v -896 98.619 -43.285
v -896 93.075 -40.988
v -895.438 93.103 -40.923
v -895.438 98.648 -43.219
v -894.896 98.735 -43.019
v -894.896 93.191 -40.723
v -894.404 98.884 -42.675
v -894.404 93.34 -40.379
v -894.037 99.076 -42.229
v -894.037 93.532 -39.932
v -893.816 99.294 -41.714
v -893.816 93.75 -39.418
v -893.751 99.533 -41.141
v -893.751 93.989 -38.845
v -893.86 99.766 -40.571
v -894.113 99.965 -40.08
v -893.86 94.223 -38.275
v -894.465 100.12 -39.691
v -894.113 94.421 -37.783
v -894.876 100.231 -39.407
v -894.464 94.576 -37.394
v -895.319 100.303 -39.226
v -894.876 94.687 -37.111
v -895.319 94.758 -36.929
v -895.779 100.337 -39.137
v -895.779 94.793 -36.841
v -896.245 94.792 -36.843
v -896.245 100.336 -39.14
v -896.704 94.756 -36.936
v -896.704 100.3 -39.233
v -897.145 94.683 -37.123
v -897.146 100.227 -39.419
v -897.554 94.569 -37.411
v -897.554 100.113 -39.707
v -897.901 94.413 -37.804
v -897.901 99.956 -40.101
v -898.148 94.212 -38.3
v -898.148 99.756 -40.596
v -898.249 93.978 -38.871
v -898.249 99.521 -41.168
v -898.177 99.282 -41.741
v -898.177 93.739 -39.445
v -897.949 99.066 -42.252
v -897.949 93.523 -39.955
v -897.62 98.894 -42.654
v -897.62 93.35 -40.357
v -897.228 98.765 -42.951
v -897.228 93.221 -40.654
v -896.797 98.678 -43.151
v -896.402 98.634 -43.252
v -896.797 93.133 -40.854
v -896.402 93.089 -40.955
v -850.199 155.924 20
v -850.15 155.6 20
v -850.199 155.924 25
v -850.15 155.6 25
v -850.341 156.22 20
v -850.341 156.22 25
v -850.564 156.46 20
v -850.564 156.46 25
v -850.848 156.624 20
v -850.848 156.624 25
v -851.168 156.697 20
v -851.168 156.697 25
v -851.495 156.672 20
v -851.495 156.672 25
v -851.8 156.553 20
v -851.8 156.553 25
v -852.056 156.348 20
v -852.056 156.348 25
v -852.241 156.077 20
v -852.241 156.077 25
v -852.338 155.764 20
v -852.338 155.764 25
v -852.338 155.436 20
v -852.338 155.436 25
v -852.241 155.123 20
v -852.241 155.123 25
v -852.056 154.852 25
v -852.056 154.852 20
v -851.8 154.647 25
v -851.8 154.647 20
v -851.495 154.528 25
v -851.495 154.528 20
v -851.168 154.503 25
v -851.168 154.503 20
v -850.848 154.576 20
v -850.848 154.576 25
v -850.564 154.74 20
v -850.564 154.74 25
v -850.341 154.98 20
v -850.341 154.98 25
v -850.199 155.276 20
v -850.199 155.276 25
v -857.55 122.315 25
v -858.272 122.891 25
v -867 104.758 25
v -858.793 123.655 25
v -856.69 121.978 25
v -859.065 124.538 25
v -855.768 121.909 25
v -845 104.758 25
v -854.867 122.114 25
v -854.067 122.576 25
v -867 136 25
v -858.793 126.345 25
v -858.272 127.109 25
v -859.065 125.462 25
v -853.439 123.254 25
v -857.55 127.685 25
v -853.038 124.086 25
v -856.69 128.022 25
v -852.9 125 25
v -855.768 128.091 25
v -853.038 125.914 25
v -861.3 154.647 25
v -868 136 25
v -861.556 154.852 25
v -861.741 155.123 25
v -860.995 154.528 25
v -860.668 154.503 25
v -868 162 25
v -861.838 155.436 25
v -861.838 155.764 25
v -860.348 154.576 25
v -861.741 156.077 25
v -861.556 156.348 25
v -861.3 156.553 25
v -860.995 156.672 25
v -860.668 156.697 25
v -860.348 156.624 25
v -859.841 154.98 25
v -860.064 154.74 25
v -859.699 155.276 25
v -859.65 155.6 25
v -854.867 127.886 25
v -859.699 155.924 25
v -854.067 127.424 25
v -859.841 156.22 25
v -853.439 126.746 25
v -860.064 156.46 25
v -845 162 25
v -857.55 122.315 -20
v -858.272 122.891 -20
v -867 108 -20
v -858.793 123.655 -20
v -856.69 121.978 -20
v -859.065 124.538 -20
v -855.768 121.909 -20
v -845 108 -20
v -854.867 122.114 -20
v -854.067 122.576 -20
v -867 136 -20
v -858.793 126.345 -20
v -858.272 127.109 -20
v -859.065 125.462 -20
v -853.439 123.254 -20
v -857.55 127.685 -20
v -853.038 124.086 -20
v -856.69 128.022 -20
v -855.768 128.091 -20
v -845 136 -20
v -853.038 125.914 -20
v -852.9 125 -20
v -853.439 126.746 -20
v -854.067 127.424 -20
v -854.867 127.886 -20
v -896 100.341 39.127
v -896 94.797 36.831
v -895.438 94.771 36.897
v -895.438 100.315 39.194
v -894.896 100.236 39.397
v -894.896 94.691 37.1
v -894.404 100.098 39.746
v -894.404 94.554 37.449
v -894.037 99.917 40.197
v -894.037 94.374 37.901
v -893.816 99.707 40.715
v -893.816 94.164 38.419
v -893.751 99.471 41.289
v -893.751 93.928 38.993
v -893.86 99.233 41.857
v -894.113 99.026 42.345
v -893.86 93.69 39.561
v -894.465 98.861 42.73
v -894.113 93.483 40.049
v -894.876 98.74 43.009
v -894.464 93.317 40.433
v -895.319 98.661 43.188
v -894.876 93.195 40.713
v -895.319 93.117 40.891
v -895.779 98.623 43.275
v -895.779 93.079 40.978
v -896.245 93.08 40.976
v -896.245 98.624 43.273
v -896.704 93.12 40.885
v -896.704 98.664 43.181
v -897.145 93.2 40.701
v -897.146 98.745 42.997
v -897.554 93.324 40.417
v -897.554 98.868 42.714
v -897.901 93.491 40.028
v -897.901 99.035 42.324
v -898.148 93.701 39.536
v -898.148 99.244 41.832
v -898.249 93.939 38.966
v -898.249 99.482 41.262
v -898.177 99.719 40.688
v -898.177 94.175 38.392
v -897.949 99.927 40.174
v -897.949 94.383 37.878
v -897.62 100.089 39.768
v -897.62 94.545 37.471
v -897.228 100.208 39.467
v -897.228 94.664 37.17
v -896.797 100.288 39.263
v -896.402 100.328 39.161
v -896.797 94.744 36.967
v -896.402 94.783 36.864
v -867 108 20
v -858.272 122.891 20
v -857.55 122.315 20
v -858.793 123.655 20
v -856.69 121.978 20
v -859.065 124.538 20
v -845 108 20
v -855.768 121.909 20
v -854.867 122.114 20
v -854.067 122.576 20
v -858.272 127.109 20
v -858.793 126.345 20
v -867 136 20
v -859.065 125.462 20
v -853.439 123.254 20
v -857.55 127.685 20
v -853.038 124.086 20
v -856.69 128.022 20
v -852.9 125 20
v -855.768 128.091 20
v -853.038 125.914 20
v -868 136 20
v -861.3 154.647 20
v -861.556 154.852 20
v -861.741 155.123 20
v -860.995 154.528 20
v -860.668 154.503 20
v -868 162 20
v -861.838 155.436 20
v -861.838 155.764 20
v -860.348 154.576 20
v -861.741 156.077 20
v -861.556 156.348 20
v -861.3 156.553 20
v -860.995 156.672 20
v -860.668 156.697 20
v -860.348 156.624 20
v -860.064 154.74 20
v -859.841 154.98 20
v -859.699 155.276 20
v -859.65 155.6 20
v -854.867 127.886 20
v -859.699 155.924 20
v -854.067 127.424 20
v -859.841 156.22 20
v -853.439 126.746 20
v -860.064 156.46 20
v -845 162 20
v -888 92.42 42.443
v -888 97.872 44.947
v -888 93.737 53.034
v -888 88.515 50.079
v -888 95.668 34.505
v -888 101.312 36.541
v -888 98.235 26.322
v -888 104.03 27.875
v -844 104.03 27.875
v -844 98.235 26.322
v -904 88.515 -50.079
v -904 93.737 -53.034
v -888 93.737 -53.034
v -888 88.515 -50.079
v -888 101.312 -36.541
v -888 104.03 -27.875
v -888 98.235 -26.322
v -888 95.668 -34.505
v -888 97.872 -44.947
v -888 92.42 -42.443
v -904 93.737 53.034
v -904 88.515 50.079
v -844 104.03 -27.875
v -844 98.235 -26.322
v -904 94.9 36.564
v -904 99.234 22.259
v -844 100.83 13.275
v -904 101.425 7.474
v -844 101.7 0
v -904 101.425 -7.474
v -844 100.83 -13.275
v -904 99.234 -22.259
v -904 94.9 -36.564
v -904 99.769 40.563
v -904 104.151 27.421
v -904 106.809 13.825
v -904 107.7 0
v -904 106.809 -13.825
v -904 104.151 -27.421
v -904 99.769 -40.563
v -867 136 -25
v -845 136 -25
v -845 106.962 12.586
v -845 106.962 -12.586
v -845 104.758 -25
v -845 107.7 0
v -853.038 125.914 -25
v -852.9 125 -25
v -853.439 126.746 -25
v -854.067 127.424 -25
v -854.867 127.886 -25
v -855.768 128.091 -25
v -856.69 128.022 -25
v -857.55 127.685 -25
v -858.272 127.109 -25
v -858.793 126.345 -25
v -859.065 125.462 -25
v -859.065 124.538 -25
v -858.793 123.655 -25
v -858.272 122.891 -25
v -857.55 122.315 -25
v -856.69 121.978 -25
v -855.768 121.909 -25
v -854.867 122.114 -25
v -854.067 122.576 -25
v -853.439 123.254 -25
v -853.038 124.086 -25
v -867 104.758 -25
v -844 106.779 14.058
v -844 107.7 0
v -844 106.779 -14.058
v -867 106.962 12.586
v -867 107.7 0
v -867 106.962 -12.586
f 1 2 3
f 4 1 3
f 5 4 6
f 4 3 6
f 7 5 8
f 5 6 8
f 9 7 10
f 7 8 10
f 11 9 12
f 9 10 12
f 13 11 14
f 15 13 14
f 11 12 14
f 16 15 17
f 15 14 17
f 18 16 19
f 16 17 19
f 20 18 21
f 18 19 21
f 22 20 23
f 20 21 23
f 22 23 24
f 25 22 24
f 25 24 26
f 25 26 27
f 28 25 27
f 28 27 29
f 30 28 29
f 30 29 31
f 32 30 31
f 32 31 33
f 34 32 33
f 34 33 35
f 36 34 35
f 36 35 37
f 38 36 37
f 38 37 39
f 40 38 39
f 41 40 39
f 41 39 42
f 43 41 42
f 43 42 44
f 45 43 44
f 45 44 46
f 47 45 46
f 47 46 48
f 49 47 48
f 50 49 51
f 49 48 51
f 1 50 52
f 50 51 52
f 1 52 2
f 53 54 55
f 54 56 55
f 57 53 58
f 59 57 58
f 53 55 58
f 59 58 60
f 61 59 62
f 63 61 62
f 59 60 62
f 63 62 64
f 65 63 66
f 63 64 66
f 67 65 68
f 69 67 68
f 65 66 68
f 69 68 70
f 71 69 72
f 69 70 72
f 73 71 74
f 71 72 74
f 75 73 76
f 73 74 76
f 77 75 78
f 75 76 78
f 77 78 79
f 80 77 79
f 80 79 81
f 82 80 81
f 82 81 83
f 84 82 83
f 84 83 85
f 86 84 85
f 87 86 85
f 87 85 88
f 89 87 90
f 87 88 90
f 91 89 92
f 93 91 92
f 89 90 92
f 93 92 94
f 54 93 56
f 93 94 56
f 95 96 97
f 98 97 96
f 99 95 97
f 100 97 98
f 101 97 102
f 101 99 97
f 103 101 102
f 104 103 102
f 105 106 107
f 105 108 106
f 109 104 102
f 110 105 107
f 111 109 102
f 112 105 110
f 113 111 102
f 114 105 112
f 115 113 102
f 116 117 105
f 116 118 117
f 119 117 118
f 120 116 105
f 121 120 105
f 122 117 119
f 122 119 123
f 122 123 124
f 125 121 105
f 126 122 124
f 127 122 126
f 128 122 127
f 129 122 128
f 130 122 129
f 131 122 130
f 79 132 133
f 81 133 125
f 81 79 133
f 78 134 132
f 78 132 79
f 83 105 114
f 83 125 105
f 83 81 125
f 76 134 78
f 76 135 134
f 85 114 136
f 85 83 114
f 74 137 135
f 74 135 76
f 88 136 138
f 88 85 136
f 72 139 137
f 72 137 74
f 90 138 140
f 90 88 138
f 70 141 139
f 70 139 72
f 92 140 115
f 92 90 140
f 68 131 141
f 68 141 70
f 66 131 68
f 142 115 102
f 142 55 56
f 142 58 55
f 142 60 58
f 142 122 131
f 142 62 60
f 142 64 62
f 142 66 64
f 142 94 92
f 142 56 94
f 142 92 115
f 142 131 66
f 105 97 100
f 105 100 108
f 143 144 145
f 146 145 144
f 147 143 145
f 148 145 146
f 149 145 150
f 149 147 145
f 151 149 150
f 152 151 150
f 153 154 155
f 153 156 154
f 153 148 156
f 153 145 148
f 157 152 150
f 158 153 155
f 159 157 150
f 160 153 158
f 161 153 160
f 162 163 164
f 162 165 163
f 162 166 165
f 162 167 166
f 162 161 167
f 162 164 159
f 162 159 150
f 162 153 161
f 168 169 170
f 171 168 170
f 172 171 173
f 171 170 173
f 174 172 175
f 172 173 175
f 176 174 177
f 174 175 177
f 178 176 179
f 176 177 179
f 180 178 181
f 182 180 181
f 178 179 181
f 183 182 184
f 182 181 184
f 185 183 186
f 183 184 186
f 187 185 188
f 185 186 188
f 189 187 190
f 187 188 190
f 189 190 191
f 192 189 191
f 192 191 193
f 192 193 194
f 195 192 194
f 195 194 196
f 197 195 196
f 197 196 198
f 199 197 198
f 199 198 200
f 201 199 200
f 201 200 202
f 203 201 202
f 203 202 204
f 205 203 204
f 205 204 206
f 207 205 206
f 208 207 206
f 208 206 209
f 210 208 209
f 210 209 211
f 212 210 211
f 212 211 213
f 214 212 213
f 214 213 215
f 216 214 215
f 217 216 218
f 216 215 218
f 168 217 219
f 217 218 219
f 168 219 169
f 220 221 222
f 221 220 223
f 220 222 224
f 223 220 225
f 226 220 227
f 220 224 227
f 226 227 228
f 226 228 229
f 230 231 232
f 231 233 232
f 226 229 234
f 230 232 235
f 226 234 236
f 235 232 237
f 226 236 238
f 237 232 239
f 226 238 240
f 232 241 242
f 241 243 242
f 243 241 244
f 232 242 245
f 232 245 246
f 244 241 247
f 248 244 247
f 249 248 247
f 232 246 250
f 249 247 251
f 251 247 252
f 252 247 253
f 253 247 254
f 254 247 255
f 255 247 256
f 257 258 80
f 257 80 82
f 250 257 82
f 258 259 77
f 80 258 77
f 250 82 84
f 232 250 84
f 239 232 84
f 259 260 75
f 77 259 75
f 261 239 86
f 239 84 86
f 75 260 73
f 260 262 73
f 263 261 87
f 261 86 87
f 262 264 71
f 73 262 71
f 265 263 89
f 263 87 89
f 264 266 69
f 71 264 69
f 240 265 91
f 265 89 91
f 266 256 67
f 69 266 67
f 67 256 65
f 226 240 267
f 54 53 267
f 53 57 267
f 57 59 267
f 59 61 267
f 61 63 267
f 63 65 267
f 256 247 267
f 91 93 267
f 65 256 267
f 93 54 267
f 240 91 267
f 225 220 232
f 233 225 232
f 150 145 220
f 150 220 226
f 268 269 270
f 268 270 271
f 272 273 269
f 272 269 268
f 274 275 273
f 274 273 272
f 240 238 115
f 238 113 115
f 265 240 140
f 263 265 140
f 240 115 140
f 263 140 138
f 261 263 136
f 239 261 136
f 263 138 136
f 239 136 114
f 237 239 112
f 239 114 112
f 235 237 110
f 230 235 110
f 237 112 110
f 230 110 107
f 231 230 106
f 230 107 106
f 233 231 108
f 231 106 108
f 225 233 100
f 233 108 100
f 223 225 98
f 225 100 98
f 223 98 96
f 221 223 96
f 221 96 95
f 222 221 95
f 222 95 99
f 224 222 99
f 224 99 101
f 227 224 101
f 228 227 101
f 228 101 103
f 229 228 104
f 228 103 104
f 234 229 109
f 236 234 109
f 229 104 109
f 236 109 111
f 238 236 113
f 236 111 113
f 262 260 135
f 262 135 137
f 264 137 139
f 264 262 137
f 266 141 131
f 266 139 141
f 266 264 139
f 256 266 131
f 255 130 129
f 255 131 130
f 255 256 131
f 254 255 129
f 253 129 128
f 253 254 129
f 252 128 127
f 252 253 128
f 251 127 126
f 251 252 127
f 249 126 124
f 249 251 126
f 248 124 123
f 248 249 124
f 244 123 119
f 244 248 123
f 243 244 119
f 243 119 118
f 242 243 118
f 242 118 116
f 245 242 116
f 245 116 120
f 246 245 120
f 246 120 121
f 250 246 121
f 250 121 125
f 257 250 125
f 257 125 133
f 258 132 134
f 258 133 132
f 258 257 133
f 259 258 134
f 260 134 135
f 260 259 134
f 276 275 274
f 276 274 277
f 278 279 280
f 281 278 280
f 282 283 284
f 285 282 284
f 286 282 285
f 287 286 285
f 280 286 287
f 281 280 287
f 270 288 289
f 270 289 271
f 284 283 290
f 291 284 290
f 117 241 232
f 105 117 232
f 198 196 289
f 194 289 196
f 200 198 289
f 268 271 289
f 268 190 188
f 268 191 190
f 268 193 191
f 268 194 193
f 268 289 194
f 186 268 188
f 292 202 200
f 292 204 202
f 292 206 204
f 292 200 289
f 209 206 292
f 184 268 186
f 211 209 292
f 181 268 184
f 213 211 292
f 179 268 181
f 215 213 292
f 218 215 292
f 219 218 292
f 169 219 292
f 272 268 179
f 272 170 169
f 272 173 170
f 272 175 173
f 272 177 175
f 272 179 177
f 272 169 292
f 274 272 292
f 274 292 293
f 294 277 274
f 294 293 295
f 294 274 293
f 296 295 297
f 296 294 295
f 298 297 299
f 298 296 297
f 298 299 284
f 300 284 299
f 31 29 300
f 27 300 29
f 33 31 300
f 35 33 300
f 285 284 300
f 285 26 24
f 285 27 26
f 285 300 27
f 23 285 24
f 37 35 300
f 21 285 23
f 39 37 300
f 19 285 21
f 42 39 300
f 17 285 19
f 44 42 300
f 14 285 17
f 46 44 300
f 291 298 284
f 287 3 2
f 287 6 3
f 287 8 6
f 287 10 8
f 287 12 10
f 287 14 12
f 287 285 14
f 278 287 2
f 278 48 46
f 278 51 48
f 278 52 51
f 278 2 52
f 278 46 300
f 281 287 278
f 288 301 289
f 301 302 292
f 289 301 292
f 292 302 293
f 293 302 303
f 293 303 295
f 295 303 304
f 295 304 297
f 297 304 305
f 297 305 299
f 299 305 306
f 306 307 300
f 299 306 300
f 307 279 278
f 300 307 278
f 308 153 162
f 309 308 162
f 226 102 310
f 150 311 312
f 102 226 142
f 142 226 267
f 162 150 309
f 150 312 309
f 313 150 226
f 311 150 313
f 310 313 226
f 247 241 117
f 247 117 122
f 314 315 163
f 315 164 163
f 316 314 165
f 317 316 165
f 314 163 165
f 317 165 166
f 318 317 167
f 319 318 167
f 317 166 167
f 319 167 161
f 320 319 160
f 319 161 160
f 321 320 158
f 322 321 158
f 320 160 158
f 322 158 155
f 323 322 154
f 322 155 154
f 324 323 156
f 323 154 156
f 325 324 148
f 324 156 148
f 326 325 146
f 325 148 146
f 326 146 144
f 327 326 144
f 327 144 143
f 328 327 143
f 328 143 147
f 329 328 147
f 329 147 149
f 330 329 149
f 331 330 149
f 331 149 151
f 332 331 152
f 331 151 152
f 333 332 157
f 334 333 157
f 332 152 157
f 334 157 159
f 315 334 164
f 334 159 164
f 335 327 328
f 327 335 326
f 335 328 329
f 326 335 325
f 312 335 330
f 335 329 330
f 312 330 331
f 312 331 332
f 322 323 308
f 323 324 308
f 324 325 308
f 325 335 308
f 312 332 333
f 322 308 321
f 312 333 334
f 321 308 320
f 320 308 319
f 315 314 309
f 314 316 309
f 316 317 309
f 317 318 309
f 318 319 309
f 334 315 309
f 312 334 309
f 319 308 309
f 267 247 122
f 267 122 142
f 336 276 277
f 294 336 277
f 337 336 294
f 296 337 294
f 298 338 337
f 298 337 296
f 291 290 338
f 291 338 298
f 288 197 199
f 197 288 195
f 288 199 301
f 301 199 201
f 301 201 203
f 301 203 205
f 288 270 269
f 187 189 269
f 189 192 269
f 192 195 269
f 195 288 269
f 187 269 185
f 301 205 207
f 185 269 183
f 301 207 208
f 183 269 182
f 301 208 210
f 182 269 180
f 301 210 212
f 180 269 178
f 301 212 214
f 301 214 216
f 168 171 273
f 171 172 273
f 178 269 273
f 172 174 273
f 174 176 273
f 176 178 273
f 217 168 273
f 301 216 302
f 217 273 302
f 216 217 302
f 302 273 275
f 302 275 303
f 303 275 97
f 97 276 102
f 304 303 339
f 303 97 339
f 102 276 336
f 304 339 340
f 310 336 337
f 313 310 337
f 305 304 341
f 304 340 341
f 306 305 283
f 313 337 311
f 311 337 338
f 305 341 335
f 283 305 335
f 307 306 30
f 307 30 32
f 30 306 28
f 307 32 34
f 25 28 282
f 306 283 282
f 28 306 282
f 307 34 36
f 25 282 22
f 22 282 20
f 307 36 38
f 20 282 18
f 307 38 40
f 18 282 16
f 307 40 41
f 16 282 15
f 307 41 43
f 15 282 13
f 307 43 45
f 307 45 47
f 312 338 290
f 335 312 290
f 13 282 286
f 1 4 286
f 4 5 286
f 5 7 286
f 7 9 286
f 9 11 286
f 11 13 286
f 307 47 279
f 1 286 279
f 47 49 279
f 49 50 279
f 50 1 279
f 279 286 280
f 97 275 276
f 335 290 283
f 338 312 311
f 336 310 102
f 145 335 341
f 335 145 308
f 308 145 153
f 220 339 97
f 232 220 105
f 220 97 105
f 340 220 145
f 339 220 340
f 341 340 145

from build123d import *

# Parameters (mm, degrees)
ROW_SKETCH_W            = 16
ROW_SKETCH_H            = 6
ROW_ANGLE               = 59
HEEL_SKETCH_W           = 44
HEEL_SKETCH_H           = 6
HEEL_ANGLE              = 30
LUG_BLOCK_SKETCH_W      = 22
LUG_BLOCK_SKETCH_H      = 33
LUG_BLOCK_DEPTH         = 25
SLOT_SKETCH_W           = 32
SLOT_SKETCH_H           = 33
SLOT_DEPTH              = 20
PIN_HOLE_SKETCH_R       = 3.1
PIN_HOLE_DEPTH          = 30
TAB_SKETCH_W            = 23
TAB_SKETCH_H            = 26
TAB_DEPTH               = 5
SWITCH_HOLES_SKETCH_R   = 1.1
SWITCH_HOLES_DEPTH      = 30
SCREW_HOLE_1_SKETCH_R   = 2.25
SCREW_HOLE_1_DEPTH      = 200
SCREW_HOLE_1_SKETCH_2_R = 2.25
SCREW_HOLE_1_2_DEPTH    = 200


with BuildPart() as part:
    # Row Sketch → Row (revolve, symmetric)
    with BuildSketch(Plane.XY) as row_sk:
        with Locations((-896, 104.7)):
            Rectangle(ROW_SKETCH_W, ROW_SKETCH_H)
    revolve(axis=Axis((-3000, 0, 0), (1, 0, 0)), revolution_arc=ROW_ANGLE / 2)
    revolve(row_sk.sketch, axis=Axis((-3000, 0, 0), (-1, 0, 0)), revolution_arc=ROW_ANGLE / 2)

    # Heel Sketch → Heel (revolve, symmetric)
    with BuildSketch(Plane.XY) as heel_sk:
        with Locations((-866, 104.7)):
            Rectangle(HEEL_SKETCH_W, HEEL_SKETCH_H)
    revolve(axis=Axis((-3000, 0, 0), (1, 0, 0)), revolution_arc=HEEL_ANGLE / 2)
    revolve(heel_sk.sketch, axis=Axis((-3000, 0, 0), (-1, 0, 0)), revolution_arc=HEEL_ANGLE / 2)

    # Lug Block Sketch → Lug Block (add, symmetric)
    with BuildSketch(Plane.XY):
        with Locations((-856, 119.5)):
            Rectangle(LUG_BLOCK_SKETCH_W, LUG_BLOCK_SKETCH_H)
    extrude(amount=LUG_BLOCK_DEPTH, both=True)

    # Slot Sketch → Slot (cut, symmetric)
    with BuildSketch(Plane.XY):
        with Locations((-856, 124.5)):
            Rectangle(SLOT_SKETCH_W, SLOT_SKETCH_H)
    extrude(amount=SLOT_DEPTH, both=True, mode=Mode.SUBTRACT)

    # Pin Hole Sketch → Pin Hole (cut, symmetric)
    with BuildSketch(Plane.XY):
        with Locations((-856, 125)):
            Circle(PIN_HOLE_SKETCH_R)
    extrude(amount=PIN_HOLE_DEPTH, both=True, mode=Mode.SUBTRACT)

    # Tab Sketch → Tab (add)
    with BuildSketch(Plane.XY.offset(20)):
        with Locations((-856.5, 149)):
            Rectangle(TAB_SKETCH_W, TAB_SKETCH_H)
    extrude(amount=TAB_DEPTH)

    # Switch Holes Sketch → Switch Holes (cut, symmetric)
    with BuildSketch(Plane.XY):
        with Locations((-860.75, 155.6)):
            Circle(SWITCH_HOLES_SKETCH_R)
        with Locations((-851.25, 155.6)):
            Circle(SWITCH_HOLES_SKETCH_R)
    extrude(amount=SWITCH_HOLES_DEPTH, both=True, mode=Mode.SUBTRACT)

    # Screw Hole -1 Sketch → Screw Hole -1 (cut)
    with BuildSketch(Plane(origin=(0, 0, 0), x_dir=(-1, 0, 0), z_dir=(0, -0.9238795325112867, 0.38268343236508984))):
        with Locations((896, 0)):
            Circle(SCREW_HOLE_1_SKETCH_R)
    extrude(amount=-SCREW_HOLE_1_DEPTH, mode=Mode.SUBTRACT)

    # Screw Hole 1 Sketch 2 → Screw Hole 1 2 (cut)
    with BuildSketch(Plane(origin=(0, 0, 0), x_dir=(-1, 0, 0), z_dir=(0, -0.9238795325112867, -0.3826834323650897))):
        with Locations((896, 0)):
            Circle(SCREW_HOLE_1_SKETCH_2_R)
    extrude(amount=-SCREW_HOLE_1_2_DEPTH, mode=Mode.SUBTRACT)


solid = part.part
